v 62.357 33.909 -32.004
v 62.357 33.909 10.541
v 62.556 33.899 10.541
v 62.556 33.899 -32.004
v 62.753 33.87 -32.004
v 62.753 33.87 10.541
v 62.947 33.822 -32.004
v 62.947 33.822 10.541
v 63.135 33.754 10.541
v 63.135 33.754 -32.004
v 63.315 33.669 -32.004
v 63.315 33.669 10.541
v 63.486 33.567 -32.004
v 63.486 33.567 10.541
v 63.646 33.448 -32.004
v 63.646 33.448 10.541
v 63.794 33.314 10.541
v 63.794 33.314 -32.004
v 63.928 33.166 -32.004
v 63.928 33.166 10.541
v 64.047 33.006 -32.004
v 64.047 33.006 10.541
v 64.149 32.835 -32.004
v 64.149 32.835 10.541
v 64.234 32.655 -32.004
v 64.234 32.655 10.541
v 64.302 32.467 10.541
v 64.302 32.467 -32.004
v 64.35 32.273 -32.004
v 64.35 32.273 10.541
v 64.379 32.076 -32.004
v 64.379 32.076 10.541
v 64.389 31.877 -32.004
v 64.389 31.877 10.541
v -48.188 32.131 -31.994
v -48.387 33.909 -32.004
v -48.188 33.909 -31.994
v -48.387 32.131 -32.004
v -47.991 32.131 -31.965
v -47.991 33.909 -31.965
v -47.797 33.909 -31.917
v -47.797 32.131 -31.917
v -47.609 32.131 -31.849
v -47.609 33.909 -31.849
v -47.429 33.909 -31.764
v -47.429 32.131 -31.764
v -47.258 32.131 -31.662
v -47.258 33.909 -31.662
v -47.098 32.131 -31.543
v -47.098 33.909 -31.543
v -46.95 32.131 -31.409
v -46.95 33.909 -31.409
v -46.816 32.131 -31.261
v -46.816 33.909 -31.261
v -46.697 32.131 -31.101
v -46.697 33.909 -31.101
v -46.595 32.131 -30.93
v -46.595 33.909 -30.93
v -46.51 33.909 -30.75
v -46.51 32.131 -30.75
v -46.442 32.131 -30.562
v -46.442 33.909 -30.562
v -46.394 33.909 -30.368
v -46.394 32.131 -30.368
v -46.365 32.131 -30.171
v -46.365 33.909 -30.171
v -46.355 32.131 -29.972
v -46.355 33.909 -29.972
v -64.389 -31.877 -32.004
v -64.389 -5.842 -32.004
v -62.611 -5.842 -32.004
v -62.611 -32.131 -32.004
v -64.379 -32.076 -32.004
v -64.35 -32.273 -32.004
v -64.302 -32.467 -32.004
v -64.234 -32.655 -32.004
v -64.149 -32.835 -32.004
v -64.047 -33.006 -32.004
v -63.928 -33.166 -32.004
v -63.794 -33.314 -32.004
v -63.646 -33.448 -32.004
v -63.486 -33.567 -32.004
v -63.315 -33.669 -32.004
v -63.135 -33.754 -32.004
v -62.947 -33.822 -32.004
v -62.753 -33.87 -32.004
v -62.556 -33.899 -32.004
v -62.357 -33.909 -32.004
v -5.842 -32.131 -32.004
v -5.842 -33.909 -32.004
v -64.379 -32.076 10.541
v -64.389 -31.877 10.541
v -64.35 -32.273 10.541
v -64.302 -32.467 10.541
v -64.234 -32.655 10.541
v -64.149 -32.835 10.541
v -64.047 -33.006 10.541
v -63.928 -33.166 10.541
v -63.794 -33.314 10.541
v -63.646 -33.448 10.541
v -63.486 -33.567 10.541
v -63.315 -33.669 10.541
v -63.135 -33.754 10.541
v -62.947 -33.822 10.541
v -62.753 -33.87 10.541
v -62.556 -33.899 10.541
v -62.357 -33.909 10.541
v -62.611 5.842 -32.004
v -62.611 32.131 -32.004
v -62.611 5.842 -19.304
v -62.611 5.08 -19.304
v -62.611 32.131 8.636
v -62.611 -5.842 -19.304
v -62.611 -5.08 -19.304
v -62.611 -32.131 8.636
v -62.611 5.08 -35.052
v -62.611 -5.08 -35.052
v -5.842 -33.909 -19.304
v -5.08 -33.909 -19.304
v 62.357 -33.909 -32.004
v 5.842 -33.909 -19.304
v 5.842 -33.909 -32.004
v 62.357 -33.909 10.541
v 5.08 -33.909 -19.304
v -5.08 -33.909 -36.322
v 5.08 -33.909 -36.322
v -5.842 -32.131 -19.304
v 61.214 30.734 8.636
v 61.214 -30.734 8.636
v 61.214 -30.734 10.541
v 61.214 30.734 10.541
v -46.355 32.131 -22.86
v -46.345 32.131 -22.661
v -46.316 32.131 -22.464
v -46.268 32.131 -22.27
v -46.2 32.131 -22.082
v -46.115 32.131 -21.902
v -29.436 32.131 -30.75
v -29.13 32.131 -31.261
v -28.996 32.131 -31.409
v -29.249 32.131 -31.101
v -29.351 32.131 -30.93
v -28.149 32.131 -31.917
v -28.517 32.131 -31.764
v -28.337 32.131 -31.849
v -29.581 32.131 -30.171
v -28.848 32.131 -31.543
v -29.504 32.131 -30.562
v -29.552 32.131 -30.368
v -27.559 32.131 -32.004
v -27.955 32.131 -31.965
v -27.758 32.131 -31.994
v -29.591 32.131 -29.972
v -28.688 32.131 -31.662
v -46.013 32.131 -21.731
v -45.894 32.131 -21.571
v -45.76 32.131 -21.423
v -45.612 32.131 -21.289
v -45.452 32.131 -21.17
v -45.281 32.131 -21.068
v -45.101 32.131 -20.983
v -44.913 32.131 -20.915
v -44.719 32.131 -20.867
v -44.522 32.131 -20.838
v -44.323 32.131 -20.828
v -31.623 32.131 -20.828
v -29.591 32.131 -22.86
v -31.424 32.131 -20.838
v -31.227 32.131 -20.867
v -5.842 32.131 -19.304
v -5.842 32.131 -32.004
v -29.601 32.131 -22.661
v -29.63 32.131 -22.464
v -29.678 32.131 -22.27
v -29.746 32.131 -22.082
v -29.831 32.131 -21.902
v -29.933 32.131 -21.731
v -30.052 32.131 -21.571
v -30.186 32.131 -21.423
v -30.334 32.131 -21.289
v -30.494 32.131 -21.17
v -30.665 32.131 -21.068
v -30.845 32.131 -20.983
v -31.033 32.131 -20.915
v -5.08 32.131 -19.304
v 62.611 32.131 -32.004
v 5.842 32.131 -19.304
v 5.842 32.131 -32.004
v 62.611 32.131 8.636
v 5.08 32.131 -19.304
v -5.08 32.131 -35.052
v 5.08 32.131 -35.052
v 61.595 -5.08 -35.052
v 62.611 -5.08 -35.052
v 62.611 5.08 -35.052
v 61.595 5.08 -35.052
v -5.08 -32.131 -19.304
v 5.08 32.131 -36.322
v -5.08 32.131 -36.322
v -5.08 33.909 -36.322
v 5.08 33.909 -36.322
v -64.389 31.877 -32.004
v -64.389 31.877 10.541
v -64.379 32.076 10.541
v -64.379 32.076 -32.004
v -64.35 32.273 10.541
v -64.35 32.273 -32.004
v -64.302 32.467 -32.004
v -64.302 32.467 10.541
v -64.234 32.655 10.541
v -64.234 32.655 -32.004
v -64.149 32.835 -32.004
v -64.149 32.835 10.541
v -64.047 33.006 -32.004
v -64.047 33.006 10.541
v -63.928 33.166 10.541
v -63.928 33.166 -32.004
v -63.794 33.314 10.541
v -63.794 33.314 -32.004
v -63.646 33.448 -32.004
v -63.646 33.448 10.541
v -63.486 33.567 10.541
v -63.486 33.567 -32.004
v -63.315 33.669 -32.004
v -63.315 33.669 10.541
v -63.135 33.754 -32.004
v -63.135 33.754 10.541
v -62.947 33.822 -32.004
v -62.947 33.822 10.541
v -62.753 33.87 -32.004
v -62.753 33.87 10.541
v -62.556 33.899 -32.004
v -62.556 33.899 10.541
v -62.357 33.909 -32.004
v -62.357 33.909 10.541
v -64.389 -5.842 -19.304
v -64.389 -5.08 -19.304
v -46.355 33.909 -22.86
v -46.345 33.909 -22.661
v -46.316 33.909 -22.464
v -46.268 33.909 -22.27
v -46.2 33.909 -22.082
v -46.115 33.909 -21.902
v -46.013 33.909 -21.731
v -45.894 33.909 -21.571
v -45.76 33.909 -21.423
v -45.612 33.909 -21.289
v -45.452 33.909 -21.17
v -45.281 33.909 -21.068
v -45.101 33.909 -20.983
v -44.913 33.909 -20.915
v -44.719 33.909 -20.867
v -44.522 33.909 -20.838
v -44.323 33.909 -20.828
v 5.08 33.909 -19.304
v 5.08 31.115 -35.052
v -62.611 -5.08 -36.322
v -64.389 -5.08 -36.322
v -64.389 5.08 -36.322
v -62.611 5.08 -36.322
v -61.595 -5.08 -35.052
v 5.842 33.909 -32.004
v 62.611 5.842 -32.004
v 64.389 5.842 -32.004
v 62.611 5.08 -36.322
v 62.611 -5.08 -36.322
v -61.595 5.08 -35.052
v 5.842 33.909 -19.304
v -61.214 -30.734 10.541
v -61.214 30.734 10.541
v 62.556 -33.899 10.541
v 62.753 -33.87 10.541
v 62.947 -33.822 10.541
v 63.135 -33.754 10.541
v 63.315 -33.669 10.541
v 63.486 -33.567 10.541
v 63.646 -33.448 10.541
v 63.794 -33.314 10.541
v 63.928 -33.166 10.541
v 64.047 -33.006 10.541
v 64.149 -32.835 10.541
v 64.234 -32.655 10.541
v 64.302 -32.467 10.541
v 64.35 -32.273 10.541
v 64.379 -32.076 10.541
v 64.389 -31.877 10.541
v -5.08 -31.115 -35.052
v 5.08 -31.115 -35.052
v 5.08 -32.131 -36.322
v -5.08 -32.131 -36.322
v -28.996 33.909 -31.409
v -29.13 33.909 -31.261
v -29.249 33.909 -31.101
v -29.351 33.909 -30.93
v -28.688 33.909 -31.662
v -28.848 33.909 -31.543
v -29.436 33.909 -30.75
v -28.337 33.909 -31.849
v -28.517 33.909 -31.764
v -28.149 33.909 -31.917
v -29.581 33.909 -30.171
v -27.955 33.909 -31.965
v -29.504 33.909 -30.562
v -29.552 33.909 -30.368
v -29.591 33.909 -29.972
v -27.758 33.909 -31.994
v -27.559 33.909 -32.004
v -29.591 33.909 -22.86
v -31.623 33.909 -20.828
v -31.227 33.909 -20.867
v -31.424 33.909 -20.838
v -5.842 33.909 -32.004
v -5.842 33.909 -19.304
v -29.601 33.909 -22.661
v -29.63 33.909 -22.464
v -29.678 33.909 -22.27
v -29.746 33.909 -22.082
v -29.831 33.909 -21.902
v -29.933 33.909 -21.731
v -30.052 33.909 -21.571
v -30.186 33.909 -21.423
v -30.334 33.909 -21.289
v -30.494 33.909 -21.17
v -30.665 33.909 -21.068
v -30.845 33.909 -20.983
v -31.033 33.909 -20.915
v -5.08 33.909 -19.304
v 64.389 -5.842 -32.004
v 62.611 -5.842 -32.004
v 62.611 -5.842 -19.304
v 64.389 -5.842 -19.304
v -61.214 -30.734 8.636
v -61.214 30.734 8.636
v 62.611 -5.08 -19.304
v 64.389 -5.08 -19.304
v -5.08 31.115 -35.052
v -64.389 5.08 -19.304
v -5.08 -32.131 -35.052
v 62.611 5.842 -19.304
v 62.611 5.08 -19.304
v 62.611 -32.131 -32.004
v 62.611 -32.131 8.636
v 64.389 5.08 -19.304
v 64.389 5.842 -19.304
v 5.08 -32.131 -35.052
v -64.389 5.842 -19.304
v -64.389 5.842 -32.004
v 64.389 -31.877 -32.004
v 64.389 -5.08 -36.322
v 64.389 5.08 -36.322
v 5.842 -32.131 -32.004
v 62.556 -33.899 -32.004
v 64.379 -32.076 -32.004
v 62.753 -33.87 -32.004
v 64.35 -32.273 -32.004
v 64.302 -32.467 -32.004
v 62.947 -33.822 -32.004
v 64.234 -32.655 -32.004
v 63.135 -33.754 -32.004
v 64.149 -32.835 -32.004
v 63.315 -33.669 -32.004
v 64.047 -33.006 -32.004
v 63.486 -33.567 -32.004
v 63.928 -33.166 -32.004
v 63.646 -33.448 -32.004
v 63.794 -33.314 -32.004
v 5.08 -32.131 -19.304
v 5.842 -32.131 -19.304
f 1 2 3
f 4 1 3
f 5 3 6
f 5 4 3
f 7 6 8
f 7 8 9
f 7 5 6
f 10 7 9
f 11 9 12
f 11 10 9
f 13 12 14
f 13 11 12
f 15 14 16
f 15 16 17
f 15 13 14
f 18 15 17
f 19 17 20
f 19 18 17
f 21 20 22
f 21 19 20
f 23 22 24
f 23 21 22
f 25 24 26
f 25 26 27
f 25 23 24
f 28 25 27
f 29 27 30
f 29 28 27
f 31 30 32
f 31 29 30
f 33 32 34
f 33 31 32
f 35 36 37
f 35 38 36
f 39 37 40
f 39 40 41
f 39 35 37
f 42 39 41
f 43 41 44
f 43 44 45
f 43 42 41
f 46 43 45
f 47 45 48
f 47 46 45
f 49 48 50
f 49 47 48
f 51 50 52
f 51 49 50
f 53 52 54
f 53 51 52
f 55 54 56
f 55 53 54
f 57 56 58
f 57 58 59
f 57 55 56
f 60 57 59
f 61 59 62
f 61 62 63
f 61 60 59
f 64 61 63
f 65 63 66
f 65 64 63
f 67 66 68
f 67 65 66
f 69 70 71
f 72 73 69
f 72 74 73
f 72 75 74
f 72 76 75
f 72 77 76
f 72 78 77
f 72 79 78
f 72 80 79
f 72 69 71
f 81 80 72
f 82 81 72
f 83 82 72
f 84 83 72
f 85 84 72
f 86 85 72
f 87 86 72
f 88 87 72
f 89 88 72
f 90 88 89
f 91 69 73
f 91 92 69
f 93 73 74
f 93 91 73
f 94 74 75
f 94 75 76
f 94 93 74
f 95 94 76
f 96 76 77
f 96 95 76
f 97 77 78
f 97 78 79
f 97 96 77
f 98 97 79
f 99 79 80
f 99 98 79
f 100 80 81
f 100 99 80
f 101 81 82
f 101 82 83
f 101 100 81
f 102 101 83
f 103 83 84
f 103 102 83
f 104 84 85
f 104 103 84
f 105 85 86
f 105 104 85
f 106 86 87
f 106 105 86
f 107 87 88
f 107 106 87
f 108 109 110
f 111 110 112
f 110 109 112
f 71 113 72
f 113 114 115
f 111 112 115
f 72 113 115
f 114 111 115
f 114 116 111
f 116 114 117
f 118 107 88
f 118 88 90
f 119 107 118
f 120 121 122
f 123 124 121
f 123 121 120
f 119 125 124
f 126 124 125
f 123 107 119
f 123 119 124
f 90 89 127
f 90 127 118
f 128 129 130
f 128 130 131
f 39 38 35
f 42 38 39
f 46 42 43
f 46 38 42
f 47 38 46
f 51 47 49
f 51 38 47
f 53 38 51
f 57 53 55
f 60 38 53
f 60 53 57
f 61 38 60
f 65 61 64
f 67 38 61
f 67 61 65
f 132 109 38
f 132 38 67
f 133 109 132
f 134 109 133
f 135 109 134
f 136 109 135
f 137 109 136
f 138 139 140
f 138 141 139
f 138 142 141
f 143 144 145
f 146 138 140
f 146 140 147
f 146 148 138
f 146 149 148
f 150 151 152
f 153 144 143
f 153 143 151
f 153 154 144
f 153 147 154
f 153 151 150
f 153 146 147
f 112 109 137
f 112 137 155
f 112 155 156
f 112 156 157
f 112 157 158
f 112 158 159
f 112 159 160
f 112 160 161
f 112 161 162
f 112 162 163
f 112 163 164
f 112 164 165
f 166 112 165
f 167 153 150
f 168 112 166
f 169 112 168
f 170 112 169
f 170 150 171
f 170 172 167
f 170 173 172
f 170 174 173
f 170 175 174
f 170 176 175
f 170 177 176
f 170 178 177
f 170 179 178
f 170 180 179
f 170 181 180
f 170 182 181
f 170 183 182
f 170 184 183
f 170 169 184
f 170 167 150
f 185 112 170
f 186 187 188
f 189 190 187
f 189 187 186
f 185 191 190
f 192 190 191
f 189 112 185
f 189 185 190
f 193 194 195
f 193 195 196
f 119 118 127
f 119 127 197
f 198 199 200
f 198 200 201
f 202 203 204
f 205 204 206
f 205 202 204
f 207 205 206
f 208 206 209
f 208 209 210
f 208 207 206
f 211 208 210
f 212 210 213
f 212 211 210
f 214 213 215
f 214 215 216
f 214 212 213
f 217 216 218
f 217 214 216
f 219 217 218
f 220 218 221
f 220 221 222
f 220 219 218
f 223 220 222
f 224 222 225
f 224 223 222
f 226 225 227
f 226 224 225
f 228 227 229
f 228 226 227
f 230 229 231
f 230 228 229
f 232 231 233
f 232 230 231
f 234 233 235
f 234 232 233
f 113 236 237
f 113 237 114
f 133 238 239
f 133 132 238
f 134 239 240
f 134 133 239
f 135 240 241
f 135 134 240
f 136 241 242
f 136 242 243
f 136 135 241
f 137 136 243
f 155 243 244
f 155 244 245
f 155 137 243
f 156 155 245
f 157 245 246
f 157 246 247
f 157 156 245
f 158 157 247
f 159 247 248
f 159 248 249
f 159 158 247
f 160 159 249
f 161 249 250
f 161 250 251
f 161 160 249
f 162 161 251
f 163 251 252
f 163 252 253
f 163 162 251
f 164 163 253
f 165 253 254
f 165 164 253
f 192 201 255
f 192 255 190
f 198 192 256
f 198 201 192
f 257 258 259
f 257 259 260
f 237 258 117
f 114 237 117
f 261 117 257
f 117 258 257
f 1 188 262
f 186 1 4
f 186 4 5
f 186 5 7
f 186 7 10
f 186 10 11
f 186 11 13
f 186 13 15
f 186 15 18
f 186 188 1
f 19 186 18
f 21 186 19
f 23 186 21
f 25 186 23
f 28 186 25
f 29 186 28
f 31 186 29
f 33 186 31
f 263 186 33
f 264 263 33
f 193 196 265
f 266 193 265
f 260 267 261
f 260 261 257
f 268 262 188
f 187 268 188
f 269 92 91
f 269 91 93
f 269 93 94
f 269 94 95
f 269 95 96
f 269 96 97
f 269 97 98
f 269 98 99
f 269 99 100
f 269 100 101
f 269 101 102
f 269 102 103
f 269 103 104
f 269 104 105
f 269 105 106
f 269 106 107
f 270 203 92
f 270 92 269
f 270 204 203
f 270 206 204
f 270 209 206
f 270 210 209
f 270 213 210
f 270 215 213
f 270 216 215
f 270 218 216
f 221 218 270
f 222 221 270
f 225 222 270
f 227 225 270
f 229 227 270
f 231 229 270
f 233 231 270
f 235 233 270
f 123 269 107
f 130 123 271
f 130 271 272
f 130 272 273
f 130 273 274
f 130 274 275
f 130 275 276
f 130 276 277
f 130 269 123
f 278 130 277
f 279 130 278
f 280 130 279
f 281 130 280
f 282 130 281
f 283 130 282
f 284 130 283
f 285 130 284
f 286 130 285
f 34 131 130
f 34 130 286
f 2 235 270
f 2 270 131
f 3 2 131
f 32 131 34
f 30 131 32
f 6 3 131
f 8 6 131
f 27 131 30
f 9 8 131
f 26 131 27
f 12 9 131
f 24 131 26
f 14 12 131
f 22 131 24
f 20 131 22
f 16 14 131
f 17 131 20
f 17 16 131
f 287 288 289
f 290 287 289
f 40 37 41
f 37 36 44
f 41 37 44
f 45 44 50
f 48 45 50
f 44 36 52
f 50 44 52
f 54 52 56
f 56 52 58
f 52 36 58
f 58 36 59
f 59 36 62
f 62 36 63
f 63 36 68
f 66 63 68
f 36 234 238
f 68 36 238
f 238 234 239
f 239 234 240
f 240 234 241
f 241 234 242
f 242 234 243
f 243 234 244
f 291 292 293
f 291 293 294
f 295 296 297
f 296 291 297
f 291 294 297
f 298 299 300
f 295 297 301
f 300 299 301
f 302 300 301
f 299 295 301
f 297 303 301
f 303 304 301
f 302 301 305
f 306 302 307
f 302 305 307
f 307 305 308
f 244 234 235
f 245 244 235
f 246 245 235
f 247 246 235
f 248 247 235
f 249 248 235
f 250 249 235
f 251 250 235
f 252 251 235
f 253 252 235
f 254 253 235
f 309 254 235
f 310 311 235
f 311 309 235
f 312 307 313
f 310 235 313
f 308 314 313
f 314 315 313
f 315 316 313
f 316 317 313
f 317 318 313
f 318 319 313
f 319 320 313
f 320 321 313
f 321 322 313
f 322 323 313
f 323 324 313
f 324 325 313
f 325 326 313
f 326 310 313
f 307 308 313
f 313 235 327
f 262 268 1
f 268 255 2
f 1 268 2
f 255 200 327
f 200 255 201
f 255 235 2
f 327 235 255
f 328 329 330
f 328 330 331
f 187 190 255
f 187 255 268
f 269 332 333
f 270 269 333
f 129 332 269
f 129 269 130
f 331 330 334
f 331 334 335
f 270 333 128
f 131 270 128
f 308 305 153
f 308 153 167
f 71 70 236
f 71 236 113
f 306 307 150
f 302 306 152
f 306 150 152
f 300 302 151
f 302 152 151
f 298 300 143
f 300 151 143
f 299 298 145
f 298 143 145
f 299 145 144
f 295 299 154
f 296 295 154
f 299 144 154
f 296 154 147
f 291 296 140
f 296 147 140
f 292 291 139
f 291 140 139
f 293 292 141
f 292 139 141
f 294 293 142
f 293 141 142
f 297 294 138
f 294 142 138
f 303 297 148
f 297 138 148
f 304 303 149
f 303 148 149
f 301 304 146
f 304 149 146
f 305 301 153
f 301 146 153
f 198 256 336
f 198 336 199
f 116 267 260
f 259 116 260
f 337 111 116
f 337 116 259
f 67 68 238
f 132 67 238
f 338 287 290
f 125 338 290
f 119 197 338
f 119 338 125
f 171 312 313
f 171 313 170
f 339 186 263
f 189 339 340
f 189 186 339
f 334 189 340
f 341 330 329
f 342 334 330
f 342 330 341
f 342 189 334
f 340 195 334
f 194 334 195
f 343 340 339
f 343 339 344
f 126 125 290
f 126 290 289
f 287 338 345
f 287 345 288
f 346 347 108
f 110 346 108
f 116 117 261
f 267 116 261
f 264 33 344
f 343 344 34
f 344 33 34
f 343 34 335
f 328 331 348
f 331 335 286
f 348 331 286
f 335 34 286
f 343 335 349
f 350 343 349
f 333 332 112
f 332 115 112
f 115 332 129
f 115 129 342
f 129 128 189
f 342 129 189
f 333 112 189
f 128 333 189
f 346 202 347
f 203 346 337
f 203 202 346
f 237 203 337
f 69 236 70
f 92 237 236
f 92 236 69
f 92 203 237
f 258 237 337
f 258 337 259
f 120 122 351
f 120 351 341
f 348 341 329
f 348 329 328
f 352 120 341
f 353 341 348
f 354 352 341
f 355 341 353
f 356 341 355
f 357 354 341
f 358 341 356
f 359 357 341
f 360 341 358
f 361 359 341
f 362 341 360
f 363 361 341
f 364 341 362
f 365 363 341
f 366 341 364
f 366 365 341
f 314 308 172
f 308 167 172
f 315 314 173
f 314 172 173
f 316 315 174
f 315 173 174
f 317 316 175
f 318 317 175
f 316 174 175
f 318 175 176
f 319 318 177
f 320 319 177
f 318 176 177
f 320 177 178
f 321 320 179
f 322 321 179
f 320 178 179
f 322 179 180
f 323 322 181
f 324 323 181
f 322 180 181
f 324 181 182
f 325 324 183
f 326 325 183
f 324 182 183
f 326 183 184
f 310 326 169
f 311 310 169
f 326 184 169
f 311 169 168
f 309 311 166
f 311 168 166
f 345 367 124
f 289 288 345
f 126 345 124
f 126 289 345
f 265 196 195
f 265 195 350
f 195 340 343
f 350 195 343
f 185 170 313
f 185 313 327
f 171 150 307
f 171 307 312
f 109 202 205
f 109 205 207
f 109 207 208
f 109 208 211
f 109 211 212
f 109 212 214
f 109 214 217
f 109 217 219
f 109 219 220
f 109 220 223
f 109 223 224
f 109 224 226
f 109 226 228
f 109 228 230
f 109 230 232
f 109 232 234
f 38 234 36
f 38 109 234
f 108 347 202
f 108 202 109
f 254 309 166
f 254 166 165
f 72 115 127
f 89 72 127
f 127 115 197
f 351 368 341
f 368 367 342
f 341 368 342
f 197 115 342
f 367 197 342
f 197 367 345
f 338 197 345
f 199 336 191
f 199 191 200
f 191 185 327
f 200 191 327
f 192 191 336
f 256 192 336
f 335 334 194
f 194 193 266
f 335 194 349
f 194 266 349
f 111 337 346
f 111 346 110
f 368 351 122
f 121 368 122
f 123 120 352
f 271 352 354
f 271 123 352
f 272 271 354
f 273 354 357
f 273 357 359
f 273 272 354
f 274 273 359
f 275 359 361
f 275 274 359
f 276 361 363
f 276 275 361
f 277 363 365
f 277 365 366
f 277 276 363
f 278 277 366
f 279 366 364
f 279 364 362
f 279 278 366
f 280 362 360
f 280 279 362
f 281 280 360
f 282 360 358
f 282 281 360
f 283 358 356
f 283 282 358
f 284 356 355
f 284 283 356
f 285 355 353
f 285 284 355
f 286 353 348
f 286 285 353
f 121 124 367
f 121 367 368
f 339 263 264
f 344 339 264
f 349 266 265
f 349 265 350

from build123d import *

# Parameters (mm, degrees)
SKETCH003_W     = 128.778
SKETCH003_H     = 67.818
SKETCH003_W_2   = 122.428
SKETCH003_H_2   = 61.468
PAD002_DEPTH    = 1.905
SKETCH004_W     = 128.778
SKETCH004_H     = 67.818
SKETCH004_W_2   = 125.222
SKETCH004_H_2   = 64.262
PAD003_DEPTH    = 40.64
SKETCH009_W     = 10.16
SKETCH009_H     = 1.778
SKETCH009_W_2   = 1.778
SKETCH009_H_2   = 10.16
PAD008_DEPTH    = 4.318
PAD009_DEPTH    = 10.16
PAD010_DEPTH    = 10.16
FILLET001_R     = 2.032
SKETCH013_W     = 0.762
SKETCH013_H     = 2.54
SKETCH013_W_2   = 2.54
SKETCH013_H_2   = 0.762
POCKET_DEPTH    = 12.7
SKETCH018_W     = 16.764
SKETCH018_H     = 11.176
POCKET002_DEPTH = 1.778
FILLET002_R     = 2.032


with BuildPart() as part:
    # Sketch003 → Pad002 (new body)
    with BuildSketch(Plane.XY.offset(8.636)):
        Rectangle(SKETCH003_W, SKETCH003_H)
        Rectangle(SKETCH003_W_2, SKETCH003_H_2, mode=Mode.SUBTRACT)
    extrude(amount=PAD002_DEPTH)

    # Sketch004 → Pad003 (new body)
    with BuildSketch(Plane(origin=(0, 0, 8.636), x_dir=(1, 0, 0), z_dir=(0, 0, -1))):
        Rectangle(SKETCH004_W, SKETCH004_H)
        Rectangle(SKETCH004_W_2, SKETCH004_H_2, mode=Mode.SUBTRACT)
    extrude(amount=PAD003_DEPTH)

    # Sketch009 → Pad008 (new body)
    with BuildSketch(Plane(origin=(0, 0, -32.004), x_dir=(1, 0, 0), z_dir=(0, 0, -1))):
        with Locations((0, 33.02)):
            Rectangle(SKETCH009_W, SKETCH009_H)
        with Locations((0, -33.02)):
            Rectangle(SKETCH009_W, SKETCH009_H)
        with Locations((-63.5, 0)):
            Rectangle(SKETCH009_W_2, SKETCH009_H_2)
        with Locations((63.5, 0)):
            Rectangle(SKETCH009_W_2, SKETCH009_H_2)
    extrude(amount=PAD008_DEPTH)

    # Sketch010 → Pad009 (new body)
    with BuildSketch(Plane(origin=(-5.08, 0, 8.636), x_dir=(0, -1, 0), z_dir=(-1, 0, 0))):
        Polygon((-32.131, -44.958), (-32.131, -43.688), (-31.115, -43.688), align=None)
        Polygon((32.131, -44.958), (32.131, -43.688), (31.115, -43.688), align=None)
    extrude(amount=-PAD009_DEPTH)

    # Sketch011 → Pad010 (new body)
    with BuildSketch(Plane(origin=(0, -5.08, 8.636), x_dir=(1, 0, 0), z_dir=(0, -1, 0))):
        Polygon((-62.611, -44.958), (-62.611, -43.688), (-61.595, -43.688), align=None)
        Polygon((62.611, -44.958), (62.611, -43.688), (61.595, -43.688), align=None)
    extrude(amount=-PAD010_DEPTH)

    # Fillet001
    fillet001_edges = [part.edges().sort_by_distance(p)[0] for p in [
        (64.389, -33.909, 9.5885),
        (64.389, -33.909, -11.684),
        (64.389, 33.909, 9.5885),
        (64.389, 33.909, -11.684),
        (-64.389, 33.909, -11.684),
        (-64.389, 33.909, 9.5885),
        (-64.389, -33.909, -11.684),
        (-64.389, -33.909, 9.5885),
    ]]
    fillet(fillet001_edges, radius=FILLET001_R)

    # Sketch013 → Pocket (cut)
    with BuildSketch(Plane(origin=(0, 0, -32.004), x_dir=(1, 0, 0), z_dir=(0, 0, -1))):
        with Locations((-5.461, 32.639)):
            Rectangle(SKETCH013_W, SKETCH013_H)
        with Locations((5.461, 32.639)):
            Rectangle(SKETCH013_W, SKETCH013_H)
        with Locations((-5.461, -32.639)):
            Rectangle(SKETCH013_W, SKETCH013_H)
        with Locations((5.461, -32.639)):
            Rectangle(SKETCH013_W, SKETCH013_H)
        with Locations((-63.119, 5.461)):
            Rectangle(SKETCH013_W_2, SKETCH013_H_2)
        with Locations((-63.119, -5.461)):
            Rectangle(SKETCH013_W_2, SKETCH013_H_2)
        with Locations((63.119, 5.461)):
            Rectangle(SKETCH013_W_2, SKETCH013_H_2)
        with Locations((63.119, -5.461)):
            Rectangle(SKETCH013_W_2, SKETCH013_H_2)
    extrude(amount=-POCKET_DEPTH, mode=Mode.SUBTRACT)

    # Sketch018 → Pocket002 (cut)
    with BuildSketch(Plane(origin=(0, 33.909, 8.636), x_dir=(-1, 0, 0), z_dir=(0, 1, 0))):
        with Locations((37.973, -35.052)):
            Rectangle(SKETCH018_W, SKETCH018_H)
    extrude(amount=-POCKET002_DEPTH, mode=Mode.SUBTRACT)

    # Fillet002
    fillet002_edges = [part.edges().sort_by_distance(p)[0] for p in [
        (-46.355, 33.02, -32.004),
        (-46.355, 33.02, -20.828),
        (-29.591, 33.02, -20.828),
        (-29.591, 33.02, -32.004),
    ]]
    fillet(fillet002_edges, radius=FILLET002_R)


solid = part.part
